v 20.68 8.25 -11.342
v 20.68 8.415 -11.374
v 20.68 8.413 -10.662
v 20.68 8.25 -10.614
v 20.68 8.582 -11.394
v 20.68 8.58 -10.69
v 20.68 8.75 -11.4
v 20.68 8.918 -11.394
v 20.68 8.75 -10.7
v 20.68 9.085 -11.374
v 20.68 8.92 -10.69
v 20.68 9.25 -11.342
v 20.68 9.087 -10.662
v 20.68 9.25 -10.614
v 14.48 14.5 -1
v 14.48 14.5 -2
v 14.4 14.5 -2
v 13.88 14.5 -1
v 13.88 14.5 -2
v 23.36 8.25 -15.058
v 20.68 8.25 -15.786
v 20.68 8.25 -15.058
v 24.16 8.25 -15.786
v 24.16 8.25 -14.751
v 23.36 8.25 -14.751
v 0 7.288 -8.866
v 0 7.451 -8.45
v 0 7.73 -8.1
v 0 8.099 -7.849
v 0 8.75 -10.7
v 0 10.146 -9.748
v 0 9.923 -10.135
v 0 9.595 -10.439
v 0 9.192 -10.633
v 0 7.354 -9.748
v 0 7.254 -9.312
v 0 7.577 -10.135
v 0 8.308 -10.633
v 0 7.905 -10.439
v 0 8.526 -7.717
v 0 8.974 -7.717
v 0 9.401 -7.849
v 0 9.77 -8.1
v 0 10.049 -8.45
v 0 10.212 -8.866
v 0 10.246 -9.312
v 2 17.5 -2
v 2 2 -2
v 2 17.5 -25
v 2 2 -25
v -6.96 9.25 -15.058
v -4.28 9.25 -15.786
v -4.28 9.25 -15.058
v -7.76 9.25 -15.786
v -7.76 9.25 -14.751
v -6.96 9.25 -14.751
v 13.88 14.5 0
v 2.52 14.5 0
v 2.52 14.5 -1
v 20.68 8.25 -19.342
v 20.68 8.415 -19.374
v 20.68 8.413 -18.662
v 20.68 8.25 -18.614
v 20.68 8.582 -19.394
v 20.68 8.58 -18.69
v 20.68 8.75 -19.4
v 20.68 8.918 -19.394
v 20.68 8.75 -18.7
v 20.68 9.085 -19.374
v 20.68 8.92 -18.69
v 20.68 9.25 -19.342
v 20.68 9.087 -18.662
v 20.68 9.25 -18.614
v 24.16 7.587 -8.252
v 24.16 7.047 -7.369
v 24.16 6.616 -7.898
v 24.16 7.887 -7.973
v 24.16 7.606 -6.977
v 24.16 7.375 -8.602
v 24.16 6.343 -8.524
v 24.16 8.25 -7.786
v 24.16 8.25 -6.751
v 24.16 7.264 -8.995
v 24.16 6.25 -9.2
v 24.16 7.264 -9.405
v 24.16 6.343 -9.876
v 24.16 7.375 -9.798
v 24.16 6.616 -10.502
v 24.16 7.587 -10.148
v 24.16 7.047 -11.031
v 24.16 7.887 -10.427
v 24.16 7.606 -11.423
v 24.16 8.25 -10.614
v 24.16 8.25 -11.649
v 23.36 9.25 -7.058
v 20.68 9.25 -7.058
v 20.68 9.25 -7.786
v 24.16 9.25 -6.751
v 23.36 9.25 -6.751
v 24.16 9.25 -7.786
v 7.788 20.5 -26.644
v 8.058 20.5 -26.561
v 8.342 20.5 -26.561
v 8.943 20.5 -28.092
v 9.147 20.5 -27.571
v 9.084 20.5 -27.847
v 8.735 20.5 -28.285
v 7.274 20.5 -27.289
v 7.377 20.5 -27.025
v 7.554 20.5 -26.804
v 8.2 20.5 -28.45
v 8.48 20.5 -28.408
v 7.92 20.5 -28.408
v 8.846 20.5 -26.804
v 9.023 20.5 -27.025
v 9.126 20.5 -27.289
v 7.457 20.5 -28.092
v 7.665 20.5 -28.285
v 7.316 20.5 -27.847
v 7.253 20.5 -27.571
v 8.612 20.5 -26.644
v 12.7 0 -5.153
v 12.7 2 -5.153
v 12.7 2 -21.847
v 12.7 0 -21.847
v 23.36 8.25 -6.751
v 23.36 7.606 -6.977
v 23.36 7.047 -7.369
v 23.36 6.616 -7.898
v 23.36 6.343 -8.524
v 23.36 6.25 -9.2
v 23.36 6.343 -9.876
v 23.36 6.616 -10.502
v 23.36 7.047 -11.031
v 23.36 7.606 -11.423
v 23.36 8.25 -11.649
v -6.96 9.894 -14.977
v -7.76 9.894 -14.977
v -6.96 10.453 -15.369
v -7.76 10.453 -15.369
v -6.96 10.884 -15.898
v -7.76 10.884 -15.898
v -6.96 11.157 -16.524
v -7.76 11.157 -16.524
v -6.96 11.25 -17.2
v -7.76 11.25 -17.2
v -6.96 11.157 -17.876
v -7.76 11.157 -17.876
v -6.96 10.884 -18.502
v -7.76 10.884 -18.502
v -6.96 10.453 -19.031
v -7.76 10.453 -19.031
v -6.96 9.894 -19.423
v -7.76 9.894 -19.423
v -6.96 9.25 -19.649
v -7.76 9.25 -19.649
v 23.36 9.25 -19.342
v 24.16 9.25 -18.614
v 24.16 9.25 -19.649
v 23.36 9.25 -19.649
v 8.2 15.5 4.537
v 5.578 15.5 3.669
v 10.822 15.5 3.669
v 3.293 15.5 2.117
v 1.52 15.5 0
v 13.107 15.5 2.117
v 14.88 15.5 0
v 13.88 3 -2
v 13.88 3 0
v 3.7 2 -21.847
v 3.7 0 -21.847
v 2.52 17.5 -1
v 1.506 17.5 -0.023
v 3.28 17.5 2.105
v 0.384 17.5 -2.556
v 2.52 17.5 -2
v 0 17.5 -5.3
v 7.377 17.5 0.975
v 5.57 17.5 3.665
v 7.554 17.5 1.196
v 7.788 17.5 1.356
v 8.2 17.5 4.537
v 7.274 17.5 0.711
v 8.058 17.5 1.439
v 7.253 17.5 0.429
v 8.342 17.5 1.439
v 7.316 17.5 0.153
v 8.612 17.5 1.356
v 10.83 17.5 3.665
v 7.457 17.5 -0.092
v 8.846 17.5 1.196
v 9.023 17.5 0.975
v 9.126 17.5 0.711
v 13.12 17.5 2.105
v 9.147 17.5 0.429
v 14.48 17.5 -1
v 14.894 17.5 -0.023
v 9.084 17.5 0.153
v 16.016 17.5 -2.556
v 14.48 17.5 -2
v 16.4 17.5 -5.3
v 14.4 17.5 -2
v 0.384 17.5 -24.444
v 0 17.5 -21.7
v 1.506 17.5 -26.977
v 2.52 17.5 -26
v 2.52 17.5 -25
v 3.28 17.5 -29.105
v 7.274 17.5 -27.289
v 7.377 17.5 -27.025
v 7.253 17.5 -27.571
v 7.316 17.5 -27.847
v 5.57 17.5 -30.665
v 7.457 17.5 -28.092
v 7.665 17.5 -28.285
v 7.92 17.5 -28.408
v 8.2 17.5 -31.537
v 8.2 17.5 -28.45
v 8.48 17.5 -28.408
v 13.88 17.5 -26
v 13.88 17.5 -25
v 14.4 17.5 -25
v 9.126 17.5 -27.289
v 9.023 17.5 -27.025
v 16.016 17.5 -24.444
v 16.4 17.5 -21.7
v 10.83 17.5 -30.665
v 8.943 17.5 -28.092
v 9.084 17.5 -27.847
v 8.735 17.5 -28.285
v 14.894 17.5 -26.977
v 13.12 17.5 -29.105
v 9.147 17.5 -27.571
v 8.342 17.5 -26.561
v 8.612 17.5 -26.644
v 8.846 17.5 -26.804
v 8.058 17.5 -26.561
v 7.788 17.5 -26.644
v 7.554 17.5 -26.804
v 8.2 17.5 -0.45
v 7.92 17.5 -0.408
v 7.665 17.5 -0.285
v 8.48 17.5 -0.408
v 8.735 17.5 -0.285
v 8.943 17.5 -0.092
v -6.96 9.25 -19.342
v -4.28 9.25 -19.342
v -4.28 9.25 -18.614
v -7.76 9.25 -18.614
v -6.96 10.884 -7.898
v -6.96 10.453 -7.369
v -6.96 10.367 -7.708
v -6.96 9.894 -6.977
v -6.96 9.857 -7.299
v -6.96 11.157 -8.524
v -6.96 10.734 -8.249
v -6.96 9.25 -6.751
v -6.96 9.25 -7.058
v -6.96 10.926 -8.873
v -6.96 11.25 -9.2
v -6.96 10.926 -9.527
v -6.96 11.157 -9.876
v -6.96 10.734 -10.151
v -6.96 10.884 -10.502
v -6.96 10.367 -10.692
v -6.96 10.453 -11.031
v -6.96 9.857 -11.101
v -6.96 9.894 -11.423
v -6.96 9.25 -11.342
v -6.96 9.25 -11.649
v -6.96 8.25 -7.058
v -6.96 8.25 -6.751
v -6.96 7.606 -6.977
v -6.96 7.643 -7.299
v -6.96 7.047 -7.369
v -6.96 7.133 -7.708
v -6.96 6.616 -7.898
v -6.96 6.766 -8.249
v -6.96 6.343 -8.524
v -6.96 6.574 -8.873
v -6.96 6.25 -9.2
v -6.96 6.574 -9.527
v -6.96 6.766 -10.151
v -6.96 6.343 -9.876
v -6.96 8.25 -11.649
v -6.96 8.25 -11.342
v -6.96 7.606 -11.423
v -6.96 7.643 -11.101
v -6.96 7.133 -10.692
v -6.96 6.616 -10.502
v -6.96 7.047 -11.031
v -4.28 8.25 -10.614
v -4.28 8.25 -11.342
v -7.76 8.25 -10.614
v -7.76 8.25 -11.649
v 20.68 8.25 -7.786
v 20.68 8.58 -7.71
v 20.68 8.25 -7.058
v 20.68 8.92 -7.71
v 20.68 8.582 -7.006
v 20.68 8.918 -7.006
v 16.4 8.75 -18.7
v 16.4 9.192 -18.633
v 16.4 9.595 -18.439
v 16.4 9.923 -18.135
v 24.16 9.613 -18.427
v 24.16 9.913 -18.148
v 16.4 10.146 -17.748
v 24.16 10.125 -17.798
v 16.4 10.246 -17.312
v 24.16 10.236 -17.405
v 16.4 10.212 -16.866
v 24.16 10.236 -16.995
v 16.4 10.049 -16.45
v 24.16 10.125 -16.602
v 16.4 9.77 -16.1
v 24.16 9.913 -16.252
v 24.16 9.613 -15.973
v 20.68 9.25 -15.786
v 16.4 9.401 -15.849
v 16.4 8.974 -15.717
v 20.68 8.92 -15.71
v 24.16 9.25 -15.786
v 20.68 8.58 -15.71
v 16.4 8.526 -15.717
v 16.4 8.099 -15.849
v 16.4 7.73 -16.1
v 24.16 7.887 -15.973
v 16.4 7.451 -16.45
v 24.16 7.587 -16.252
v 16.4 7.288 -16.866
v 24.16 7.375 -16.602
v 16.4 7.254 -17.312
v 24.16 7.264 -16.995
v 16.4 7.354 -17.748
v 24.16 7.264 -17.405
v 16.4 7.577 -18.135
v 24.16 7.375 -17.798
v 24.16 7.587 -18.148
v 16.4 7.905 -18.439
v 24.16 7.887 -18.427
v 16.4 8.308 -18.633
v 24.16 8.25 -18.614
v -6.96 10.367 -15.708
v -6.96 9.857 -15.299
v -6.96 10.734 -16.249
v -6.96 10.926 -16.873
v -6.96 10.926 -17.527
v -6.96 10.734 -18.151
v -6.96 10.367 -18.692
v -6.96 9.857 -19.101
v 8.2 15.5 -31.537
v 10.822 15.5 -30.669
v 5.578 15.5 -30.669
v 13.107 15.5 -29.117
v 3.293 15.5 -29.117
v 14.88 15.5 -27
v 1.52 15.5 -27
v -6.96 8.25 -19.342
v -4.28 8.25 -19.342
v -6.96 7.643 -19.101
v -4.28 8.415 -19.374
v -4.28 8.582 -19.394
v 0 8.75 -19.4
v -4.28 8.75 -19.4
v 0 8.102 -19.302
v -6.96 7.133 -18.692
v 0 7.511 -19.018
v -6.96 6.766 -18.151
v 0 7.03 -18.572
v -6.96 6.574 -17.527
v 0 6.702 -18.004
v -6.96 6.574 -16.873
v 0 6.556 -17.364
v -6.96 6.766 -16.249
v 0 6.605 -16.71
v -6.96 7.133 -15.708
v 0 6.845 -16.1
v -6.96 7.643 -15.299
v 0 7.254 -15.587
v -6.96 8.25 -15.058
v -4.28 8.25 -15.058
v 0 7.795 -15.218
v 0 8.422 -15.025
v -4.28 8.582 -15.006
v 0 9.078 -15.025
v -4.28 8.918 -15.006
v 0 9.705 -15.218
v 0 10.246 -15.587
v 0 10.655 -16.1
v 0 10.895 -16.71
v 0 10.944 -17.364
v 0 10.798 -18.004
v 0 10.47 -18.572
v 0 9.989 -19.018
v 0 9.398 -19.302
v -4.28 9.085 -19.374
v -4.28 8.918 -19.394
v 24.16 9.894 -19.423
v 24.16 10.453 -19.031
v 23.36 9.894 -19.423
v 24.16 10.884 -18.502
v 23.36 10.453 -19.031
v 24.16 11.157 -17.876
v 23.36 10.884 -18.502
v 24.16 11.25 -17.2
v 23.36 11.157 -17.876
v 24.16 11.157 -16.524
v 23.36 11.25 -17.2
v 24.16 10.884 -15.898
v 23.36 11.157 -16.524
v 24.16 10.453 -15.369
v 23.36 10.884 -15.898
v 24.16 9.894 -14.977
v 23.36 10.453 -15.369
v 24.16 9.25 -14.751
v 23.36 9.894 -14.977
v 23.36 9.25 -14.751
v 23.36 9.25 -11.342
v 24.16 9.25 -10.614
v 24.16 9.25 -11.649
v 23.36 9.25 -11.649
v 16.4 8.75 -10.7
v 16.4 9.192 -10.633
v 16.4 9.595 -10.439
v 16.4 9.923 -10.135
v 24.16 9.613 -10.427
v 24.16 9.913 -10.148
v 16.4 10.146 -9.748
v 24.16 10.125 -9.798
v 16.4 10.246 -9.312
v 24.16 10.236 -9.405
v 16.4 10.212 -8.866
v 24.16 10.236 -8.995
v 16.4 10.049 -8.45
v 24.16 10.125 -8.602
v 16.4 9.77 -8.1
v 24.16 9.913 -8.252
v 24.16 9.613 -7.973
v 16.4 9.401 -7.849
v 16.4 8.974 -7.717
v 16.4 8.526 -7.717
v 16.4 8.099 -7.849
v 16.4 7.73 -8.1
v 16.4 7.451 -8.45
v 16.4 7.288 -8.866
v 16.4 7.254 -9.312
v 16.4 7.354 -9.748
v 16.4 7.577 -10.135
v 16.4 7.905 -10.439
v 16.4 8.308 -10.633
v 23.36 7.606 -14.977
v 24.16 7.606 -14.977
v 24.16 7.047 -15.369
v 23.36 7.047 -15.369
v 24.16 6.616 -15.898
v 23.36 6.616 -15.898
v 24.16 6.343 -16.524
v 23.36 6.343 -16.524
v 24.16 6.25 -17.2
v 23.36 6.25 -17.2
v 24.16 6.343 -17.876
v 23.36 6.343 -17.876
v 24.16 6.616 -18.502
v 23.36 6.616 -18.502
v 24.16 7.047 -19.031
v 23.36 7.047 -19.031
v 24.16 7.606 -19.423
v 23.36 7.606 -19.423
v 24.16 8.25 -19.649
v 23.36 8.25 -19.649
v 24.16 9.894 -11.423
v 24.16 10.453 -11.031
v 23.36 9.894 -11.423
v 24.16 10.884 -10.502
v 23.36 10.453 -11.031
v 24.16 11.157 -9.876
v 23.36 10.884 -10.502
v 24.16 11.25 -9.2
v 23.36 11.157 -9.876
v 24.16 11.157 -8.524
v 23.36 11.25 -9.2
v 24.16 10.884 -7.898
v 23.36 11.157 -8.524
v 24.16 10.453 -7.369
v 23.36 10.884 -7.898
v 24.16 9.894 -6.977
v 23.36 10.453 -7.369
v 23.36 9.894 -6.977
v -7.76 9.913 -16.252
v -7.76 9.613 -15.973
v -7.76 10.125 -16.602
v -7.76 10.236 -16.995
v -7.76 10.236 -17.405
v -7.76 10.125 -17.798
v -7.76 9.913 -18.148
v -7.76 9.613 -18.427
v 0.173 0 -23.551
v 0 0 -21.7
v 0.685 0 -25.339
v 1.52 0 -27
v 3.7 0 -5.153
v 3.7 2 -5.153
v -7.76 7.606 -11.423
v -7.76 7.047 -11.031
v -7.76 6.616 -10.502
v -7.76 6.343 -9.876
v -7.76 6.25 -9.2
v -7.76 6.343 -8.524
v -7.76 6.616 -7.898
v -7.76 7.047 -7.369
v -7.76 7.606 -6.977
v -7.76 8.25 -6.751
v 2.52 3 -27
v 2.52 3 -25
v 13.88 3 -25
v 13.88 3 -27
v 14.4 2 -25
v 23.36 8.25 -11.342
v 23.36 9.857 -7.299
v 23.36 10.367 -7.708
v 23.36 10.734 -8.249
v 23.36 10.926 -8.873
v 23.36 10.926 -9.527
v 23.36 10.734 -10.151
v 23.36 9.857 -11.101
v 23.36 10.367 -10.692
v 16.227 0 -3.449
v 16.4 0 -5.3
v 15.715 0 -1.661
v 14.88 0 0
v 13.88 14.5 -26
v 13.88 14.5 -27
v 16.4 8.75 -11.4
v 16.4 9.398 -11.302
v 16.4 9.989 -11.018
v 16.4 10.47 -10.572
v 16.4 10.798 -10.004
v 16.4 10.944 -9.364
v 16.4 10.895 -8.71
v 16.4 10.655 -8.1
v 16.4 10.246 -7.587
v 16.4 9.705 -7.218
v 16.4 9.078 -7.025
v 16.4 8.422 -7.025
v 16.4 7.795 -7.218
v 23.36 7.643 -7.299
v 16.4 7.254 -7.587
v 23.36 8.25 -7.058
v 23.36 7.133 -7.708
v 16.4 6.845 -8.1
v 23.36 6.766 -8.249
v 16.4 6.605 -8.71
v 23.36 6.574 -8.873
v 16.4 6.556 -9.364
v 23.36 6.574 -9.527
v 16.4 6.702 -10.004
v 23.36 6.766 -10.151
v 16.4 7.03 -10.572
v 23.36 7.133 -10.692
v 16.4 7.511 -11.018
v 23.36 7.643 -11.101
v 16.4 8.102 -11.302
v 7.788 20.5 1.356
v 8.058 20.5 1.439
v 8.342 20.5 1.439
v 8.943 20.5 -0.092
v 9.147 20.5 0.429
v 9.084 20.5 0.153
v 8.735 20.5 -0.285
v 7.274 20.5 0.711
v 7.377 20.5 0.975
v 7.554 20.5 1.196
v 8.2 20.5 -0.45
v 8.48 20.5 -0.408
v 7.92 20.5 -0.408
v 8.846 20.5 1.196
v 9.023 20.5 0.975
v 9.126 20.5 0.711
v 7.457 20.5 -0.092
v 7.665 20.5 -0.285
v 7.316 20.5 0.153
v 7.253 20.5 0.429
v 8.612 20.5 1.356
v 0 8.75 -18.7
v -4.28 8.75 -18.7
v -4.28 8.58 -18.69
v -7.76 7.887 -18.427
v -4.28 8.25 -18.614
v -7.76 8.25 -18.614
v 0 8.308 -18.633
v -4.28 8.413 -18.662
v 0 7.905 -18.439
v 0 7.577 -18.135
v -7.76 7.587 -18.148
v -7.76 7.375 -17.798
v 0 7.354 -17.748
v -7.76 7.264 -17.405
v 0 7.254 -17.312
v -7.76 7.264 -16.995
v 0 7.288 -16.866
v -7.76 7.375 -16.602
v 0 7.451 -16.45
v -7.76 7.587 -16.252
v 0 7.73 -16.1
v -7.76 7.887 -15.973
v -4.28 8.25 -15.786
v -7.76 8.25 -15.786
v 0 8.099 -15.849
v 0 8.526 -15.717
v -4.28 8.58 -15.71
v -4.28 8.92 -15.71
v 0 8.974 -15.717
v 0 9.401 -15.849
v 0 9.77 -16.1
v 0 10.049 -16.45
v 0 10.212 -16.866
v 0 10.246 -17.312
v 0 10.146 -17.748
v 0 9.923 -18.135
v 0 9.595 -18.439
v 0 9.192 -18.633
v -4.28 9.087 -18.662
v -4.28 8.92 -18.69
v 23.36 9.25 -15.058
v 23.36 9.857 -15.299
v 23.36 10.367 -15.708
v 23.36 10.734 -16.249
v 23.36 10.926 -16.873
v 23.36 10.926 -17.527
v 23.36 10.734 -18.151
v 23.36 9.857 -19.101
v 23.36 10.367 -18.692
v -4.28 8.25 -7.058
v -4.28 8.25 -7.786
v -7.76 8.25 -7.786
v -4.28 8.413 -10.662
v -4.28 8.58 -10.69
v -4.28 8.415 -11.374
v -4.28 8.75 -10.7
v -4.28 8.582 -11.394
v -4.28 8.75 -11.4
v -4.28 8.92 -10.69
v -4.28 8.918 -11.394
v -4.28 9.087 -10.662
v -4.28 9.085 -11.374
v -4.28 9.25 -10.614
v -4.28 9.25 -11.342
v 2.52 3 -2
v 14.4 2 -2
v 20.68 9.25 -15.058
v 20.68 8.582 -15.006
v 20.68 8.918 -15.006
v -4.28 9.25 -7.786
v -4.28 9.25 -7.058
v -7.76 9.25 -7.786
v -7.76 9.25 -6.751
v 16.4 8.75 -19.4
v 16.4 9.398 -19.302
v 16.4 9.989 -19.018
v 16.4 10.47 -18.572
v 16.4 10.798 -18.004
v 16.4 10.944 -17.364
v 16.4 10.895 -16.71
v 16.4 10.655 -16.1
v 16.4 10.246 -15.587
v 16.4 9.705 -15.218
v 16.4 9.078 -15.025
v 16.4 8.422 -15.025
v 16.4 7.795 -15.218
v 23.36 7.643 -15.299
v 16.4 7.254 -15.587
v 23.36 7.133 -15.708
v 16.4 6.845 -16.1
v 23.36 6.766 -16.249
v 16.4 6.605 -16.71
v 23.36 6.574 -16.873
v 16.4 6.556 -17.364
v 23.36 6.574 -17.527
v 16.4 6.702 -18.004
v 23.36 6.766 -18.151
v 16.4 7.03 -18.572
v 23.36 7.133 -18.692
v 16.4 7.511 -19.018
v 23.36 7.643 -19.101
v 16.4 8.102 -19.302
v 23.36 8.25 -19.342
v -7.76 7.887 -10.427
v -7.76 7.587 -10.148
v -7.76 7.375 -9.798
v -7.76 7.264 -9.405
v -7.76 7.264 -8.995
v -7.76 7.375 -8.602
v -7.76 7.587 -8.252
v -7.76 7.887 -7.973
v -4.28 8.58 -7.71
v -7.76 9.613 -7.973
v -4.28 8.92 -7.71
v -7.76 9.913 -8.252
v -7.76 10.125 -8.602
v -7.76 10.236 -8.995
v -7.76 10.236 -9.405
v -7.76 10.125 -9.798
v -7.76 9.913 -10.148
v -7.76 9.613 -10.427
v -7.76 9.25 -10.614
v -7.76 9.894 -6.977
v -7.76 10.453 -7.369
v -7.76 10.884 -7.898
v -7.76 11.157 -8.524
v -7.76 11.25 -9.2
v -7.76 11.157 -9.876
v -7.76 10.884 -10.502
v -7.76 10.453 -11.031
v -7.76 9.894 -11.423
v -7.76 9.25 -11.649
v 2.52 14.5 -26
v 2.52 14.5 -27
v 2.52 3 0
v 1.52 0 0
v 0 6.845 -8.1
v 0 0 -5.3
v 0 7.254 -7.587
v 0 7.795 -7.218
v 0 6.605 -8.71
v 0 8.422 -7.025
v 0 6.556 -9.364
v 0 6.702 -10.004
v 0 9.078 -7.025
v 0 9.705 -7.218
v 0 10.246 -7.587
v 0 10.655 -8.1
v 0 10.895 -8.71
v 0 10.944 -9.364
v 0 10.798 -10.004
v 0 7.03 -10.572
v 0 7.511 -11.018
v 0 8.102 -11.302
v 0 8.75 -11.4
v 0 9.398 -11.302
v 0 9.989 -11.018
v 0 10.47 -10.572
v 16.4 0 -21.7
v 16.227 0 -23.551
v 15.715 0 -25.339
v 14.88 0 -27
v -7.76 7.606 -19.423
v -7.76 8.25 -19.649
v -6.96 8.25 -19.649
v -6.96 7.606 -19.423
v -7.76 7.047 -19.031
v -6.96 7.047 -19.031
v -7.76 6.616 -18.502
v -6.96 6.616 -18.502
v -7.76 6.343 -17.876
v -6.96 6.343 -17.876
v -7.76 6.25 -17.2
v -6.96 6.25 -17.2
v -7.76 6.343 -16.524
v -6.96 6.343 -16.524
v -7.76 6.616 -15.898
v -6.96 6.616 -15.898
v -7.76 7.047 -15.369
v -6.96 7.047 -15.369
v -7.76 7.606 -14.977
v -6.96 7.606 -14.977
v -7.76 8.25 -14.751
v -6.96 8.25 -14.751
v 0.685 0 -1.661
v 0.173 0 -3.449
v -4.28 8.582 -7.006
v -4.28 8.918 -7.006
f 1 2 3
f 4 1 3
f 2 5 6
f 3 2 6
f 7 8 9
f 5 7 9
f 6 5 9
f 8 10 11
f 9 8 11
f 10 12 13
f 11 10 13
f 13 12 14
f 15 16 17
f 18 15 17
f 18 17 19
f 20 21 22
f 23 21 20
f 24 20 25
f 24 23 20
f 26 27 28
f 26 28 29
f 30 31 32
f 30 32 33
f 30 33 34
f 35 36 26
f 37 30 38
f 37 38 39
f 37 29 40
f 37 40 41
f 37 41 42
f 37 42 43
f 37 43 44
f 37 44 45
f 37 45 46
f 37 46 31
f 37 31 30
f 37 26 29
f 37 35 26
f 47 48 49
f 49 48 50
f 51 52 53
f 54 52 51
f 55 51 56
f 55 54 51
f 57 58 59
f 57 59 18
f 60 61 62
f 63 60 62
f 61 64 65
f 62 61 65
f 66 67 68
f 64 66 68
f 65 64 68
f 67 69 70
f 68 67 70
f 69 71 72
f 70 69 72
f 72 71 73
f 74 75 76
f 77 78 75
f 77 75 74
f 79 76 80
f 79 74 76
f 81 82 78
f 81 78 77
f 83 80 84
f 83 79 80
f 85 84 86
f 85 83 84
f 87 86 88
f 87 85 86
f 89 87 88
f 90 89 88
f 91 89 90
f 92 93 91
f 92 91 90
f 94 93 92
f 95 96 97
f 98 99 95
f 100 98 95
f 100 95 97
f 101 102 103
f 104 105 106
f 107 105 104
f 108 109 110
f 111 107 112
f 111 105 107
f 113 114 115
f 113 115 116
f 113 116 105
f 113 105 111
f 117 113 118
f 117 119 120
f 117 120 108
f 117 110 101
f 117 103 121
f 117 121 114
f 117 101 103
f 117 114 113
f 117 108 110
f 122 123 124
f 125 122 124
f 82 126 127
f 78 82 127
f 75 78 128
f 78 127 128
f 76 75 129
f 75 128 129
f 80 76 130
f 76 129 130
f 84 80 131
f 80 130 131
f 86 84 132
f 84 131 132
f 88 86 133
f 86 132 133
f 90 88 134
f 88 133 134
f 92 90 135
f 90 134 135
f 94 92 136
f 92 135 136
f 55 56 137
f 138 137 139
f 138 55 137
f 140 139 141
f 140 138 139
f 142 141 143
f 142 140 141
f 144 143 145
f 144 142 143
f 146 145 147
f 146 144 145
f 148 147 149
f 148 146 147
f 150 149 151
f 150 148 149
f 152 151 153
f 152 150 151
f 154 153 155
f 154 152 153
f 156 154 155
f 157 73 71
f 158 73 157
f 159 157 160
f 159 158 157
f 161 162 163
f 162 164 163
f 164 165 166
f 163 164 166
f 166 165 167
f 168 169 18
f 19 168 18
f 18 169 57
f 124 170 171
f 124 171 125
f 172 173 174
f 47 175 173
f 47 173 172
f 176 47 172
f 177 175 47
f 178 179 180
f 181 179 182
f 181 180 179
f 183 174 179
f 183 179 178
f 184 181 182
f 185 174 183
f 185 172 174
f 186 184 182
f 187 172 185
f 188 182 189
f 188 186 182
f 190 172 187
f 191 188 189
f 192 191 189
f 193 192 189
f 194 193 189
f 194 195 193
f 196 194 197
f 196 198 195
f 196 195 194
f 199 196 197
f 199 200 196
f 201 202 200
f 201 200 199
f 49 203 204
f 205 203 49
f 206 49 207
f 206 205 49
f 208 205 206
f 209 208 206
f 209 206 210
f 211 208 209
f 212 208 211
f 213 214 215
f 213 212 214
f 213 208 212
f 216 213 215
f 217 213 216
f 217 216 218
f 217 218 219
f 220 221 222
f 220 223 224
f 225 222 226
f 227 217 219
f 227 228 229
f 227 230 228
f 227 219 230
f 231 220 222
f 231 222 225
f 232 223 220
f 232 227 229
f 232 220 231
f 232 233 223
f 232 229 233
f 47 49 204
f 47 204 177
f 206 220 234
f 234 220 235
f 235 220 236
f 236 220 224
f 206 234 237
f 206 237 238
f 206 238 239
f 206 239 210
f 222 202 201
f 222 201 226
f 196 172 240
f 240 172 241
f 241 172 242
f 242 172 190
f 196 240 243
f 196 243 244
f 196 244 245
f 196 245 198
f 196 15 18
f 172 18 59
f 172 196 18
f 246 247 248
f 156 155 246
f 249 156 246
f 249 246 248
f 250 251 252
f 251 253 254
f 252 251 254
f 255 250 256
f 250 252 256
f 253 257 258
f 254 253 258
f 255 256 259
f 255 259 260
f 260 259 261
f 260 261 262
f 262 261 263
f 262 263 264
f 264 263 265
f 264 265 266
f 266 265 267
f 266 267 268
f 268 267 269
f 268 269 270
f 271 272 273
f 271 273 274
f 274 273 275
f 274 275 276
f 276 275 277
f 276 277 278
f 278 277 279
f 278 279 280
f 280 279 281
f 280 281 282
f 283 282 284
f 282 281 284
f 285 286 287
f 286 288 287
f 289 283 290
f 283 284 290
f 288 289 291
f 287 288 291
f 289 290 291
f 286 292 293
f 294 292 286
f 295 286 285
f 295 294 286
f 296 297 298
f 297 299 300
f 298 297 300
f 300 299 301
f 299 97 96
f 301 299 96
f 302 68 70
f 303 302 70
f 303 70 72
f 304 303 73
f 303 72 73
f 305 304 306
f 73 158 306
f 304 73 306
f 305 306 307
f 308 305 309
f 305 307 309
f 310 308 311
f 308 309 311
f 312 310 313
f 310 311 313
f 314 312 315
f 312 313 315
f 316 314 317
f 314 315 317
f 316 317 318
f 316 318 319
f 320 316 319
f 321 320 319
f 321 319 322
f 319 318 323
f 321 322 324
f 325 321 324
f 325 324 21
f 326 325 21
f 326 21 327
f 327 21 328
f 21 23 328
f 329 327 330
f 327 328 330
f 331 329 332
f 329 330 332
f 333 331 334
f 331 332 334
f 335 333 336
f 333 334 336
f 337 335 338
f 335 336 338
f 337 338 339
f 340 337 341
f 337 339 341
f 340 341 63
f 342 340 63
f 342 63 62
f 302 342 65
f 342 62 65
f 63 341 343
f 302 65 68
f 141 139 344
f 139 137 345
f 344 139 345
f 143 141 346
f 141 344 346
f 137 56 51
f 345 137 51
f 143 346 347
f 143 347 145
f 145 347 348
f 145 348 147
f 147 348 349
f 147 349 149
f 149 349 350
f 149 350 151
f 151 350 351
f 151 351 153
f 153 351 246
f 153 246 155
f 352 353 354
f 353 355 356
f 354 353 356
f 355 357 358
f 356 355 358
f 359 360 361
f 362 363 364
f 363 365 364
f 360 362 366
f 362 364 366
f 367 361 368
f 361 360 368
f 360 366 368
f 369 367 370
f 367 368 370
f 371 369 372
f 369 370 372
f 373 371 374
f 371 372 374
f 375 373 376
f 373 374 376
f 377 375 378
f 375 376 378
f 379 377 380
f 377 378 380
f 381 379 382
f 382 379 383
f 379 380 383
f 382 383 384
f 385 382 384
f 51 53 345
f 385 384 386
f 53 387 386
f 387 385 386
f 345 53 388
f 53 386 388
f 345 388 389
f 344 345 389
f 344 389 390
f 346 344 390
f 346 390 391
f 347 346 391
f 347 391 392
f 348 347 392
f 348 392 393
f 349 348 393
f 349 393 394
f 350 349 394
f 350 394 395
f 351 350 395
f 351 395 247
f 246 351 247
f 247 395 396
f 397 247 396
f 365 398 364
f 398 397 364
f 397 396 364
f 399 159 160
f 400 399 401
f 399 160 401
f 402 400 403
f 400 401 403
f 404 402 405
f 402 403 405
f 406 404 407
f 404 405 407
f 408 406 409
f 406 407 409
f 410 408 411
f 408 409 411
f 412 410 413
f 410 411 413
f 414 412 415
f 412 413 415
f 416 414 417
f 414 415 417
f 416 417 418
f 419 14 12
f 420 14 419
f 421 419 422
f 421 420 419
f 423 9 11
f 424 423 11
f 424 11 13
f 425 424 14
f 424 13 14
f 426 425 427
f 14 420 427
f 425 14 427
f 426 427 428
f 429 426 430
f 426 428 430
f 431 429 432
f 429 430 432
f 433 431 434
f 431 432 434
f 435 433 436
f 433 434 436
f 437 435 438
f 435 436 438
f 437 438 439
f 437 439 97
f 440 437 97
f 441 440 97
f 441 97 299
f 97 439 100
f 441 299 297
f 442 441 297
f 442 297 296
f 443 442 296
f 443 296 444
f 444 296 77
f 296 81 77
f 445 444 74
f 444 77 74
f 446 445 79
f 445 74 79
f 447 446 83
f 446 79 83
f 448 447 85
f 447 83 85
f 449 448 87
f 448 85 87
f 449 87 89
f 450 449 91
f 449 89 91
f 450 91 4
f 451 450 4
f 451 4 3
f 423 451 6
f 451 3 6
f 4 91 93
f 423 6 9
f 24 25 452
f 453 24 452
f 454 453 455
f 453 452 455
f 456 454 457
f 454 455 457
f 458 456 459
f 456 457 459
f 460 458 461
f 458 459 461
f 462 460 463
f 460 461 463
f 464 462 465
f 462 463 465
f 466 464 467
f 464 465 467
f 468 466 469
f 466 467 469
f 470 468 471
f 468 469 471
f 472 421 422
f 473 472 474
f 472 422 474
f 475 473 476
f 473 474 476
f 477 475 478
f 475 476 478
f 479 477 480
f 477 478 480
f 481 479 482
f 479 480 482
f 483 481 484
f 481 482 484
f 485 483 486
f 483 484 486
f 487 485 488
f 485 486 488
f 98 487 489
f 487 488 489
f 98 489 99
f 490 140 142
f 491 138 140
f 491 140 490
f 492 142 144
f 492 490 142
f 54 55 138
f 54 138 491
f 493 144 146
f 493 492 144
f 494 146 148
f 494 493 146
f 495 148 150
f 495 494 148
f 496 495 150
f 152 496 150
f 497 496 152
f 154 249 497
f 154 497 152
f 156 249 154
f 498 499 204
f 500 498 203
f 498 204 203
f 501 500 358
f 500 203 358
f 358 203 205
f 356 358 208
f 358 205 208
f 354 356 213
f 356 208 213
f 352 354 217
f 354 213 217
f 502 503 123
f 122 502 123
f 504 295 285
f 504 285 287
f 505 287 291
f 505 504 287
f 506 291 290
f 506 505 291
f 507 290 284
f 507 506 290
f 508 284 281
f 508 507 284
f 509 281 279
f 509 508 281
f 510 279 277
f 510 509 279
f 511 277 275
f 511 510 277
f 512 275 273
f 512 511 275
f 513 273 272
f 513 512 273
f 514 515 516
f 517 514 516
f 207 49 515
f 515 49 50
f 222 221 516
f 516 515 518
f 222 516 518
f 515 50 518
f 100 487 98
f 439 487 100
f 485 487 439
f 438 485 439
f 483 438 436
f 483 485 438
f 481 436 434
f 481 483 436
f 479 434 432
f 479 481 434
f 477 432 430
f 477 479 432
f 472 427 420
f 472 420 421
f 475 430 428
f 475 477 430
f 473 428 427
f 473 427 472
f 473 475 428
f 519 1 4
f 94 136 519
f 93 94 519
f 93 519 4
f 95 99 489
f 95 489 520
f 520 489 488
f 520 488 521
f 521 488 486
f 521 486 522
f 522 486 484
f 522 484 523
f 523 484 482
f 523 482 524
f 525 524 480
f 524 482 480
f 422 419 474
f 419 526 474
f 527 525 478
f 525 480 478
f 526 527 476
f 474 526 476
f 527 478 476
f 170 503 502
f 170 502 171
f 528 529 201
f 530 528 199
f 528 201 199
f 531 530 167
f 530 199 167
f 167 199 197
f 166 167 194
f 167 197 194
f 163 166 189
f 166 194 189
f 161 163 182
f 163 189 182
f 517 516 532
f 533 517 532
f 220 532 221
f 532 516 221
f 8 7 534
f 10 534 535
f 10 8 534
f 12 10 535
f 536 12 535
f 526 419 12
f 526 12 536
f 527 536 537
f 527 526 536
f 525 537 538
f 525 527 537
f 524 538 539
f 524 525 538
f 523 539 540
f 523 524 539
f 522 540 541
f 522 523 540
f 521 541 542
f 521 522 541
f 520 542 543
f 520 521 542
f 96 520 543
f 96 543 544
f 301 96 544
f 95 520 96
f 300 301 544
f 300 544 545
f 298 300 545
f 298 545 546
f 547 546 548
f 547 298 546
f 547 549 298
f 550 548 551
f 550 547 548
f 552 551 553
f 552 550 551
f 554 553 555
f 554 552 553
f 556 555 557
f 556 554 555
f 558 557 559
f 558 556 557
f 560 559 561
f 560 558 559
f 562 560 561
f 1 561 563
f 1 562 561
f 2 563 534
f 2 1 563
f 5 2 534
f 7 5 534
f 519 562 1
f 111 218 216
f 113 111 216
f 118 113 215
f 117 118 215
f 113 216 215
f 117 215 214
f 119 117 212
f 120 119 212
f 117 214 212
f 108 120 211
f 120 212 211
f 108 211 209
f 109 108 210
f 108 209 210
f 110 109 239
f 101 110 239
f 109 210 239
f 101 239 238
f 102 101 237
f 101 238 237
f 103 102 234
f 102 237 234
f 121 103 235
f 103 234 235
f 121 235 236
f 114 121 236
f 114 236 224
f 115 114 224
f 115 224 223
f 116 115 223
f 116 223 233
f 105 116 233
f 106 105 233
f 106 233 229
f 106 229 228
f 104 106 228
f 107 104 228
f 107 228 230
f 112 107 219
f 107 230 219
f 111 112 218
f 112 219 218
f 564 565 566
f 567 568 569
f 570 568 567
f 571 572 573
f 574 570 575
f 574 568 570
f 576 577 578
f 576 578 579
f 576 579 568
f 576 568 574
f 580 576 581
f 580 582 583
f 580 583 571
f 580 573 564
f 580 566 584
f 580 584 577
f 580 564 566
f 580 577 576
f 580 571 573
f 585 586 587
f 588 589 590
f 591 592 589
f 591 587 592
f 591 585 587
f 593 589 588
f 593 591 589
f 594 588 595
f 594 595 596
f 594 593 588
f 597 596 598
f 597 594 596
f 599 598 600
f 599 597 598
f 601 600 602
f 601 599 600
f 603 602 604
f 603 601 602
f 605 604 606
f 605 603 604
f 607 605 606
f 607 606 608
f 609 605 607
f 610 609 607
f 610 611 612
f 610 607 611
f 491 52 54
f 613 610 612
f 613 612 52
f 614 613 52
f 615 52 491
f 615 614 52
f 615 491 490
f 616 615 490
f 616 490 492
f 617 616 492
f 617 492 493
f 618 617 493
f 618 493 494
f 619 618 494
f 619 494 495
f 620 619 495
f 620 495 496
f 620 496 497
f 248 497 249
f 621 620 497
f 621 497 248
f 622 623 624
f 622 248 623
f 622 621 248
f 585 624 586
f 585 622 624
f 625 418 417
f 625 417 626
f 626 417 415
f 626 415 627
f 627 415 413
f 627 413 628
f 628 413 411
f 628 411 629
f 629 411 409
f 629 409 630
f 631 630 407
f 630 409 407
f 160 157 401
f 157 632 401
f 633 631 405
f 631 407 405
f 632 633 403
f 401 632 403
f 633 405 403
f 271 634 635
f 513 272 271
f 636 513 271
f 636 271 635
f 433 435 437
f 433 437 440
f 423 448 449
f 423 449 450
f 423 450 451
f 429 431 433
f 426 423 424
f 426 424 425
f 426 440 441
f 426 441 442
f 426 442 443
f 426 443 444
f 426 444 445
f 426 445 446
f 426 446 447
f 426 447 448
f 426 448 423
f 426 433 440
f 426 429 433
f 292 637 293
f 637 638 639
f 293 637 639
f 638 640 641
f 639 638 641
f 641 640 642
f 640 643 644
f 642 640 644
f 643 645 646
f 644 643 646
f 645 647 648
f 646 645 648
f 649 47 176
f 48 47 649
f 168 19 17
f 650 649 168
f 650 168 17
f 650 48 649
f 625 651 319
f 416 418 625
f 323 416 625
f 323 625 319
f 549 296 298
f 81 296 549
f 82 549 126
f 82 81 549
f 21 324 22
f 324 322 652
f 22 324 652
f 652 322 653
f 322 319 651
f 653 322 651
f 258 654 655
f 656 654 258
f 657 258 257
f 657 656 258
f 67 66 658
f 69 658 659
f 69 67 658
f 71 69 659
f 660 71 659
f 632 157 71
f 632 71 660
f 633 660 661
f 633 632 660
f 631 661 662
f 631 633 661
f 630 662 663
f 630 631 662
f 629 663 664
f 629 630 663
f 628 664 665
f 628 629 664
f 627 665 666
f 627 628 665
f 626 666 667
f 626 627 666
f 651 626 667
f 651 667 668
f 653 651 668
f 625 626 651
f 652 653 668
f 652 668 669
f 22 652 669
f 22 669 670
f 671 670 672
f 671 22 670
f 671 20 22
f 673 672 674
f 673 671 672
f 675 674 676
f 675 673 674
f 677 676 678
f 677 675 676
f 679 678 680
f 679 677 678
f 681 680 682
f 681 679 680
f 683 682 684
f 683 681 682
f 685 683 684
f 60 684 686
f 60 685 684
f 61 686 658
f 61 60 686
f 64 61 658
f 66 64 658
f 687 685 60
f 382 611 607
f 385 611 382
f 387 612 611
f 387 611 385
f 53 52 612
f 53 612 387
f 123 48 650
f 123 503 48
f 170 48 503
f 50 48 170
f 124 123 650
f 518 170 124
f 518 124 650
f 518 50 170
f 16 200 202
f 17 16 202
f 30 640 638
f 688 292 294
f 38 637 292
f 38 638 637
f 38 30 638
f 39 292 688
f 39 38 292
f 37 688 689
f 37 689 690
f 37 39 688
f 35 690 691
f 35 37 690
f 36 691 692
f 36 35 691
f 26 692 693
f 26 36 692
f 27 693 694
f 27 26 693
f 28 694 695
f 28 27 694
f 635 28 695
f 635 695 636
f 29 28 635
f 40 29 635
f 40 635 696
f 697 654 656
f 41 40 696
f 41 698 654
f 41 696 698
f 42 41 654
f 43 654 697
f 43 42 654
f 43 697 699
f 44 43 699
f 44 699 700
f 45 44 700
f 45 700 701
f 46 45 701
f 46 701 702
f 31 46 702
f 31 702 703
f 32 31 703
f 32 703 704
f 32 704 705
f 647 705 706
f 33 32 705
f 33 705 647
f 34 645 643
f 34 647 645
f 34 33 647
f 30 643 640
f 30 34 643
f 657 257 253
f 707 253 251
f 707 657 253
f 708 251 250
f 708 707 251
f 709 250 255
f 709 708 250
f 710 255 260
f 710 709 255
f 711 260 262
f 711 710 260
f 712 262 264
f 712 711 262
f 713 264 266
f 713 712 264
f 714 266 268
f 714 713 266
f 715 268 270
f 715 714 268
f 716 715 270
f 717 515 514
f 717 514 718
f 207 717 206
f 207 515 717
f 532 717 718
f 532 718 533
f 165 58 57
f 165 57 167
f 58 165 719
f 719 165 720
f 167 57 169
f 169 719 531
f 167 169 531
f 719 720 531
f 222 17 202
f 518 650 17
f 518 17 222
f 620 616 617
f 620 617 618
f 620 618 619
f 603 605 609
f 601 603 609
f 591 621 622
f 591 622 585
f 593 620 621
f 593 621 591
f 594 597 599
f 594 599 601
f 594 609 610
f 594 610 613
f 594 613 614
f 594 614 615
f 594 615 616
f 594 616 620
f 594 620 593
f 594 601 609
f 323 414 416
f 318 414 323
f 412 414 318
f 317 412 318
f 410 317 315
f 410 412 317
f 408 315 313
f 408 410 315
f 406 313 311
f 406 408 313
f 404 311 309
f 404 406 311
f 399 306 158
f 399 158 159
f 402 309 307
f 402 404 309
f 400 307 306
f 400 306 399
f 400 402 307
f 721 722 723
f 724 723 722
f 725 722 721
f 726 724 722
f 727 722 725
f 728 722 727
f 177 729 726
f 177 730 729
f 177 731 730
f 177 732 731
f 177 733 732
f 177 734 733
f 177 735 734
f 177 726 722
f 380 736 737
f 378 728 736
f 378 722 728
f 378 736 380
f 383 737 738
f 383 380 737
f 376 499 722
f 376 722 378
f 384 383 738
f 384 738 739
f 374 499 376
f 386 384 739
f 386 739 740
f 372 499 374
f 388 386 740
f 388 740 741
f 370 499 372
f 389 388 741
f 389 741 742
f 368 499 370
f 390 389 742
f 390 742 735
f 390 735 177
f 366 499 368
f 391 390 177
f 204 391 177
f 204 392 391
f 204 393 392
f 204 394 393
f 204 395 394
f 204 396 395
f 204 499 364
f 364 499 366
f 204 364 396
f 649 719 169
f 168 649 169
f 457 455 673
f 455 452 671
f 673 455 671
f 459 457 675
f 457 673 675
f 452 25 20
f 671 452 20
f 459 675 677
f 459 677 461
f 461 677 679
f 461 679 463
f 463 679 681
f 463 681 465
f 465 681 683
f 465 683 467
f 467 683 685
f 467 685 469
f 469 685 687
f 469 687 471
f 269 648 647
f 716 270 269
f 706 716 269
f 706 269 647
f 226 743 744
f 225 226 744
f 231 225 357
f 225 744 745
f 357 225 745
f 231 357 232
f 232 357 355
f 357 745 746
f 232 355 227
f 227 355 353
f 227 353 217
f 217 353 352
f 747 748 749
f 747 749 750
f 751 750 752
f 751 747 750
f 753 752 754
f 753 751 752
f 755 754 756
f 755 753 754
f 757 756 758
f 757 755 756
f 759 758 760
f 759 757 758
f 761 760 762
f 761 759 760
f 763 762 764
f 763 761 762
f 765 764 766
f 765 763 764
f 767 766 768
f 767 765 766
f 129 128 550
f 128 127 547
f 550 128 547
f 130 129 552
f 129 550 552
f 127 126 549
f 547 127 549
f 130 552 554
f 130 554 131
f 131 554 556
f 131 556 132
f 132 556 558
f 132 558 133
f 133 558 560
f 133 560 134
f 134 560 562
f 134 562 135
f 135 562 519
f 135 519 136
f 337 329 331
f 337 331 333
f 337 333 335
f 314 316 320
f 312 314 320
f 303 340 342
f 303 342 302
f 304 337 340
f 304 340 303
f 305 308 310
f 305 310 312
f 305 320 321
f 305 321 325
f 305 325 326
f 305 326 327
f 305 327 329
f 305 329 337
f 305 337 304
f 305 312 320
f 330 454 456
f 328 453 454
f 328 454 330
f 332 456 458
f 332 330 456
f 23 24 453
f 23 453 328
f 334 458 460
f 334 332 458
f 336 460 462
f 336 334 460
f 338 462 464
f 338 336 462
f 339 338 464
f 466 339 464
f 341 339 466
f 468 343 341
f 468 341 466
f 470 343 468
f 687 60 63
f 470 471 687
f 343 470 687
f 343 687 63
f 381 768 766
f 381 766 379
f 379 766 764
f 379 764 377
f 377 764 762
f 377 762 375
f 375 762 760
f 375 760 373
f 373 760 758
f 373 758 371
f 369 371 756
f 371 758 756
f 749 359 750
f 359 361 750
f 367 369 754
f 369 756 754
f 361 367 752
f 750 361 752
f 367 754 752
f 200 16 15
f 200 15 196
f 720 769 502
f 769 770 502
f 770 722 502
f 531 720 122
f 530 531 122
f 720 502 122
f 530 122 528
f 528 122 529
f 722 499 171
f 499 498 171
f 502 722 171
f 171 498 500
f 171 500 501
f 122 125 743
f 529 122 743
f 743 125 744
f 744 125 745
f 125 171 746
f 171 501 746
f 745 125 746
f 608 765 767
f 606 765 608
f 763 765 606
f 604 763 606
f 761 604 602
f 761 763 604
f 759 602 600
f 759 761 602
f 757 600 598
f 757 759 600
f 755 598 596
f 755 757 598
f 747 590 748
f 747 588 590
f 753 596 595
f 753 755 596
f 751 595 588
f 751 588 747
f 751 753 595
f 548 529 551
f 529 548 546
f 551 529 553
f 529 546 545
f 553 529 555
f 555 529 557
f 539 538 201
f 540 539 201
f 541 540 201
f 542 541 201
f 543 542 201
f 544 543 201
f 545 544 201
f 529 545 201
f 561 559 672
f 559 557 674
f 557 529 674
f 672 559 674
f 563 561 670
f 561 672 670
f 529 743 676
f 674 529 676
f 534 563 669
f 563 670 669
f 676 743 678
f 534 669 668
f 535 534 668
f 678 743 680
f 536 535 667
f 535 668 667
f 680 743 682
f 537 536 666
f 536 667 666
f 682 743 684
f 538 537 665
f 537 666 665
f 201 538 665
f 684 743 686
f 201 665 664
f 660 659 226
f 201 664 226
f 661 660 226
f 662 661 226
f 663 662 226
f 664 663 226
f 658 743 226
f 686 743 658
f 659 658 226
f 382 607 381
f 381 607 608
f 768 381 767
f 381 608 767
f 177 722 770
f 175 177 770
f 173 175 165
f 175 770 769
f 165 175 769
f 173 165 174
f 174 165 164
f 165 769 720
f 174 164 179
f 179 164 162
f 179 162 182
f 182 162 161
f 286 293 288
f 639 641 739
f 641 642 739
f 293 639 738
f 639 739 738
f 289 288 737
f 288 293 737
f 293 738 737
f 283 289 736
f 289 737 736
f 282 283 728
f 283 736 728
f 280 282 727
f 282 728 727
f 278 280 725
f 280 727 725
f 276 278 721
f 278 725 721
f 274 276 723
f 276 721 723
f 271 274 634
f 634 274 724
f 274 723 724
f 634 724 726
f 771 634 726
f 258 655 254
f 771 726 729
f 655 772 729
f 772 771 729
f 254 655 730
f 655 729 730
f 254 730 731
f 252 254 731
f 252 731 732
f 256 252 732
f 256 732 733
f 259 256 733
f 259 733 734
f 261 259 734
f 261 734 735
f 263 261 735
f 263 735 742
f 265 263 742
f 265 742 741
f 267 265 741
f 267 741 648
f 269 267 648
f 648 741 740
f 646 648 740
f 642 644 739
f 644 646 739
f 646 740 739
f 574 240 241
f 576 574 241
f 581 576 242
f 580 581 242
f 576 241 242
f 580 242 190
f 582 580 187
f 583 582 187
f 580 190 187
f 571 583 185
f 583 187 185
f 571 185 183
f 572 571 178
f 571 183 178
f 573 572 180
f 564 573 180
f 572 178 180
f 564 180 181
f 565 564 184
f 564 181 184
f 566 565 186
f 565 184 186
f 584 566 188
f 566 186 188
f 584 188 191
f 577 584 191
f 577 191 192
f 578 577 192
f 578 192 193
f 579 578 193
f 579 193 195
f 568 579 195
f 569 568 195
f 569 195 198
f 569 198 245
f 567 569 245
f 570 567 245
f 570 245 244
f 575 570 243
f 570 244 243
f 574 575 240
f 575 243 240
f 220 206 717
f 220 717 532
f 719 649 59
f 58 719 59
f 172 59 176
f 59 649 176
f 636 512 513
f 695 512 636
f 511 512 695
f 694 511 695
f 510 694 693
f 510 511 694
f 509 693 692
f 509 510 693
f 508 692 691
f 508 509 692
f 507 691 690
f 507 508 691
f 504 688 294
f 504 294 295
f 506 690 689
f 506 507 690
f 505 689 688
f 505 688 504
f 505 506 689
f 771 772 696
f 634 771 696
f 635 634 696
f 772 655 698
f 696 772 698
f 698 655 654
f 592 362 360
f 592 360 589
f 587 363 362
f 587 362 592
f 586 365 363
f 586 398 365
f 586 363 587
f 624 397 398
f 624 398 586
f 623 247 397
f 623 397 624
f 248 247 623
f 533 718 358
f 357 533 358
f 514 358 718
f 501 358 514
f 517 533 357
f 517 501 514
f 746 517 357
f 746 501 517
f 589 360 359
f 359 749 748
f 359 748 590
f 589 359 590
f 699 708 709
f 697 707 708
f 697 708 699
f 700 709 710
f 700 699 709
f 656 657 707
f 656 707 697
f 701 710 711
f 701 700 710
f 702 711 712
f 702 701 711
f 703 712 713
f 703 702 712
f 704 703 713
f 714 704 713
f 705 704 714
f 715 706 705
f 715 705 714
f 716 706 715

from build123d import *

# Parameters (mm, degrees)
SKETCH1_W           = 16.4
SKETCH1_H           = 27
BOSS_EXTRUDE1_DEPTH = 2
SKETCH5_W           = 16.4
SKETCH5_H           = 27
SKETCH5_W_2         = 12.4
SKETCH5_H_2         = 23
BOSS_EXTRUDE2_DEPTH = 15.5
SKETCH6_W           = 16.4
SKETCH6_H           = 2
BOSS_EXTRUDE3_DEPTH = 4.7
SKETCH7_W           = 16.4
SKETCH7_H           = 2
BOSS_EXTRUDE4_DEPTH = 4.7
SKETCH8_R           = 0.95
BOSS_EXTRUDE5_DEPTH = 3
FILLET1_R           = 10
SKETCH9_R           = 2.2
BOSS_EXTRUDE6_DEPTH = 6.96
BOSS_EXTRUDE7_START = 6.96
SKETCH10_R          = 2.2
BOSS_EXTRUDE7_DEPTH = 6.96
SKETCH11_W          = 11.35995283
SKETCH11_H          = 11.5
CUT_EXTRUDE1_DEPTH  = 45.277544069
SKETCH12_W          = 9
SKETCH12_H          = 16.693548388
CUT_EXTRUDE2_DEPTH  = 10
SKETCH14_W          = 11.35995283
SKETCH14_H          = 3
CUT_EXTRUDE5_DEPTH  = 1
SKETCH15_W          = 11.95995283
SKETCH15_H          = 3
CUT_EXTRUDE6_DEPTH  = 1
SKETCH16_R          = 2.5
BOSS_EXTRUDE8_DEPTH = 0.8
BOSS_EXTRUDE9_START = 0.8
SKETCH17_R          = 2.5
BOSS_EXTRUDE9_DEPTH = 0.8
SKETCH18_W          = 6.099763115
SKETCH18_H          = 1
CUT_EXTRUDE7_DEPTH  = 3.48
CUT_EXTRUDE8_DEPTH  = 3.48
SKETCH20_R          = 1.5
CUT_EXTRUDE9_DEPTH  = 7.76
CUT_EXTRUDE10_START = -7.76
SKETCH21_R          = 1.5
CUT_EXTRUDE10_DEPTH = 7.76


with BuildPart() as part:
    # Sketch1 → Boss-Extrude1 (new body)
    with BuildSketch(Plane(origin=(0, 0, 0), x_dir=(1, 0, 0), z_dir=(0, 1, 0))):
        with Locations((8.2, 13.5)):
            Rectangle(SKETCH1_W, SKETCH1_H)
    extrude(amount=BOSS_EXTRUDE1_DEPTH)

    # Sketch5 → Boss-Extrude2 (add)
    with BuildSketch(Plane(origin=(0, 2, 0), x_dir=(1, 0, 0), z_dir=(0, 1, 0))):
        with Locations((8.2, 13.5)):
            Rectangle(SKETCH5_W, SKETCH5_H)
        with Locations((8.2, 13.5)):
            Rectangle(SKETCH5_W_2, SKETCH5_H_2, mode=Mode.SUBTRACT)
    extrude(amount=BOSS_EXTRUDE2_DEPTH)

    # Sketch6 → Boss-Extrude3 (add)
    with BuildSketch(Plane(origin=(0, 0, -27), x_dir=(-1, 0, 0), z_dir=(0, 0, -1))):
        with Locations((-8.2, 16.5)):
            Rectangle(SKETCH6_W, SKETCH6_H)
    extrude(amount=BOSS_EXTRUDE3_DEPTH)

    # Sketch7 → Boss-Extrude4 (add)
    with BuildSketch(Plane.XY):
        with Locations((8.2, 16.5)):
            Rectangle(SKETCH7_W, SKETCH7_H)
    extrude(amount=BOSS_EXTRUDE4_DEPTH)

    # Sketch8 → Boss-Extrude5 (add)
    with BuildSketch(Plane(origin=(0, 17.5, 0), x_dir=(1, 0, 0), z_dir=(0, 1, 0))):
        with Locations(Location((8.2, 27.5, 0), (0, 0, 90))):
            Circle(SKETCH8_R)
        with Locations(Location((8.2, -0.5, 0), (0, 0, 90))):
            Circle(SKETCH8_R)
    extrude(amount=BOSS_EXTRUDE5_DEPTH)

    # Fillet1
    # the kernel refuses this fillet: 10 mm, written as the material it takes off along each edge
    with BuildSketch(Plane(origin=(16.4, -9.5, -31.7), x_dir=(0, 0, 1), z_dir=(0, 1, 0)), Plane(origin=(0, 42.5, -31.7), x_dir=(0, 0, 1), z_dir=(0, -1, 0)), Plane(origin=(16.4, 42.5, 4.7), x_dir=(0, 0, -1), z_dir=(0, -1, 0)), Plane(origin=(0, -9.5, 4.7), x_dir=(0, 0, -1), z_dir=(0, 1, 0))) as fillet1_piece_1:
        with BuildLine():
            CenterArc((FILLET1_R, -FILLET1_R), FILLET1_R, 90, 90)
            Line((0, -FILLET1_R), (0, 0))
            Line((0, 0), (FILLET1_R, 0))
        make_face()
    extrude(amount=52, mode=Mode.SUBTRACT)

    # Sketch9 → Boss-Extrude6 (add)
    with BuildSketch(Plane.ZY):
        with Locations(Location((-17.2, 8.75, 0), (0, 0, 180))):
            Circle(SKETCH9_R)
        with Locations(Location((-9.2, 8.75, 0), (0, 0, 180))):
            Circle(SKETCH9_R)
    extrude(amount=BOSS_EXTRUDE6_DEPTH)

    # Sketch10 → Boss-Extrude7 (add)
    with BuildSketch(Plane(origin=(16.4, 0, 0), x_dir=(0, 0, -1), z_dir=(1, 0, 0)).offset(BOSS_EXTRUDE7_START)):
        with Locations((9.2, 8.75)):
            Circle(SKETCH10_R)
        with Locations((17.2, 8.75)):
            Circle(SKETCH10_R)
    extrude(amount=-BOSS_EXTRUDE7_DEPTH)

    # Sketch11 → Cut-Extrude1 (cut, through all)
    with BuildSketch(Plane.XY):
        with Locations((8.2, 8.75)):
            Rectangle(SKETCH11_W, SKETCH11_H)
    extrude(amount=-CUT_EXTRUDE1_DEPTH, mode=Mode.SUBTRACT)

    # Sketch12 → Cut-Extrude2 (cut)
    with BuildSketch(Plane(origin=(0, 2, 0), x_dir=(1, 0, 0), z_dir=(0, 1, 0))):
        with Locations((8.2, 13.5)):
            Rectangle(SKETCH12_W, SKETCH12_H)
    extrude(amount=-CUT_EXTRUDE2_DEPTH, mode=Mode.SUBTRACT)

    # Sketch14 → Cut-Extrude5 (cut)
    with BuildSketch(Plane.XY.offset(-25)):
        with Locations((8.2, 16)):
            Rectangle(SKETCH14_W, SKETCH14_H)
    extrude(amount=-CUT_EXTRUDE5_DEPTH, mode=Mode.SUBTRACT)

    # Sketch15 → Cut-Extrude6 (cut)
    with BuildSketch(Plane(origin=(0, 0, -2), x_dir=(-1, 0, 0), z_dir=(0, 0, -1))):
        with Locations((-8.5, 16)):
            Rectangle(SKETCH15_W, SKETCH15_H)
    extrude(amount=-CUT_EXTRUDE6_DEPTH, mode=Mode.SUBTRACT)

    # Sketch16 → Boss-Extrude8 (add)
    with BuildSketch(Plane(origin=(23.36, 0, 0), x_dir=(0, 0, -1), z_dir=(1, 0, 0))):
        with Locations((9.2, 8.75)):
            Circle(SKETCH16_R)
        with Locations((17.2, 8.75)):
            Circle(SKETCH16_R)
    extrude(amount=BOSS_EXTRUDE8_DEPTH)

    # Sketch17 → Boss-Extrude9 (add)
    with BuildSketch(Plane.ZY.offset(6.96).offset(BOSS_EXTRUDE9_START)):
        with Locations(Location((-9.2, 8.75, 0), (0, 0, 180))):
            Circle(SKETCH17_R)
        with Locations(Location((-17.2, 8.75, 0), (0, 0, 180))):
            Circle(SKETCH17_R)
    extrude(amount=-BOSS_EXTRUDE9_DEPTH)

    # Sketch18 → Cut-Extrude7 (cut)
    with BuildSketch(Plane.ZY.offset(7.76)):
        with Locations((-17.37045616, 8.75)):
            Rectangle(SKETCH18_W, SKETCH18_H)
        Polygon((-6.209519779, 8.75), (-6.209519779, 8.25), (-12.153333116, 8.25), (-12.153333116, 9.25), (-6.209519779, 9.25), align=None)
    extrude(amount=-CUT_EXTRUDE7_DEPTH, mode=Mode.SUBTRACT)

    # Sketch19 → Cut-Extrude8 (cut)
    with BuildSketch(Plane(origin=(24.16, 0, 0), x_dir=(0, 0, -1), z_dir=(1, 0, 0))):
        Polygon((6.297180826, 8.75), (6.297180826, 9.25), (20.308323275, 9.25), (20.308323275, 8.25), (6.297180826, 8.25), align=None)
    extrude(amount=-CUT_EXTRUDE8_DEPTH, mode=Mode.SUBTRACT)

    # Sketch20 → Cut-Extrude9 (cut)
    with BuildSketch(Plane(origin=(24.16, 0, 0), x_dir=(0, 0, -1), z_dir=(1, 0, 0))):
        with Locations((9.2, 8.75)):
            Circle(SKETCH20_R)
        with Locations((17.2, 8.75)):
            Circle(SKETCH20_R)
    extrude(amount=-CUT_EXTRUDE9_DEPTH, mode=Mode.SUBTRACT)

    # Sketch21 → Cut-Extrude10 (cut)
    with BuildSketch(Plane.ZY.offset(7.76).offset(CUT_EXTRUDE10_START)):
        with Locations(Location((-9.2, 8.75, 0), (0, 0, 180))):
            Circle(SKETCH21_R)
        with Locations(Location((-17.2, 8.75, 0), (0, 0, 180))):
            Circle(SKETCH21_R)
    extrude(amount=CUT_EXTRUDE10_DEPTH, mode=Mode.SUBTRACT)


solid = part.part
